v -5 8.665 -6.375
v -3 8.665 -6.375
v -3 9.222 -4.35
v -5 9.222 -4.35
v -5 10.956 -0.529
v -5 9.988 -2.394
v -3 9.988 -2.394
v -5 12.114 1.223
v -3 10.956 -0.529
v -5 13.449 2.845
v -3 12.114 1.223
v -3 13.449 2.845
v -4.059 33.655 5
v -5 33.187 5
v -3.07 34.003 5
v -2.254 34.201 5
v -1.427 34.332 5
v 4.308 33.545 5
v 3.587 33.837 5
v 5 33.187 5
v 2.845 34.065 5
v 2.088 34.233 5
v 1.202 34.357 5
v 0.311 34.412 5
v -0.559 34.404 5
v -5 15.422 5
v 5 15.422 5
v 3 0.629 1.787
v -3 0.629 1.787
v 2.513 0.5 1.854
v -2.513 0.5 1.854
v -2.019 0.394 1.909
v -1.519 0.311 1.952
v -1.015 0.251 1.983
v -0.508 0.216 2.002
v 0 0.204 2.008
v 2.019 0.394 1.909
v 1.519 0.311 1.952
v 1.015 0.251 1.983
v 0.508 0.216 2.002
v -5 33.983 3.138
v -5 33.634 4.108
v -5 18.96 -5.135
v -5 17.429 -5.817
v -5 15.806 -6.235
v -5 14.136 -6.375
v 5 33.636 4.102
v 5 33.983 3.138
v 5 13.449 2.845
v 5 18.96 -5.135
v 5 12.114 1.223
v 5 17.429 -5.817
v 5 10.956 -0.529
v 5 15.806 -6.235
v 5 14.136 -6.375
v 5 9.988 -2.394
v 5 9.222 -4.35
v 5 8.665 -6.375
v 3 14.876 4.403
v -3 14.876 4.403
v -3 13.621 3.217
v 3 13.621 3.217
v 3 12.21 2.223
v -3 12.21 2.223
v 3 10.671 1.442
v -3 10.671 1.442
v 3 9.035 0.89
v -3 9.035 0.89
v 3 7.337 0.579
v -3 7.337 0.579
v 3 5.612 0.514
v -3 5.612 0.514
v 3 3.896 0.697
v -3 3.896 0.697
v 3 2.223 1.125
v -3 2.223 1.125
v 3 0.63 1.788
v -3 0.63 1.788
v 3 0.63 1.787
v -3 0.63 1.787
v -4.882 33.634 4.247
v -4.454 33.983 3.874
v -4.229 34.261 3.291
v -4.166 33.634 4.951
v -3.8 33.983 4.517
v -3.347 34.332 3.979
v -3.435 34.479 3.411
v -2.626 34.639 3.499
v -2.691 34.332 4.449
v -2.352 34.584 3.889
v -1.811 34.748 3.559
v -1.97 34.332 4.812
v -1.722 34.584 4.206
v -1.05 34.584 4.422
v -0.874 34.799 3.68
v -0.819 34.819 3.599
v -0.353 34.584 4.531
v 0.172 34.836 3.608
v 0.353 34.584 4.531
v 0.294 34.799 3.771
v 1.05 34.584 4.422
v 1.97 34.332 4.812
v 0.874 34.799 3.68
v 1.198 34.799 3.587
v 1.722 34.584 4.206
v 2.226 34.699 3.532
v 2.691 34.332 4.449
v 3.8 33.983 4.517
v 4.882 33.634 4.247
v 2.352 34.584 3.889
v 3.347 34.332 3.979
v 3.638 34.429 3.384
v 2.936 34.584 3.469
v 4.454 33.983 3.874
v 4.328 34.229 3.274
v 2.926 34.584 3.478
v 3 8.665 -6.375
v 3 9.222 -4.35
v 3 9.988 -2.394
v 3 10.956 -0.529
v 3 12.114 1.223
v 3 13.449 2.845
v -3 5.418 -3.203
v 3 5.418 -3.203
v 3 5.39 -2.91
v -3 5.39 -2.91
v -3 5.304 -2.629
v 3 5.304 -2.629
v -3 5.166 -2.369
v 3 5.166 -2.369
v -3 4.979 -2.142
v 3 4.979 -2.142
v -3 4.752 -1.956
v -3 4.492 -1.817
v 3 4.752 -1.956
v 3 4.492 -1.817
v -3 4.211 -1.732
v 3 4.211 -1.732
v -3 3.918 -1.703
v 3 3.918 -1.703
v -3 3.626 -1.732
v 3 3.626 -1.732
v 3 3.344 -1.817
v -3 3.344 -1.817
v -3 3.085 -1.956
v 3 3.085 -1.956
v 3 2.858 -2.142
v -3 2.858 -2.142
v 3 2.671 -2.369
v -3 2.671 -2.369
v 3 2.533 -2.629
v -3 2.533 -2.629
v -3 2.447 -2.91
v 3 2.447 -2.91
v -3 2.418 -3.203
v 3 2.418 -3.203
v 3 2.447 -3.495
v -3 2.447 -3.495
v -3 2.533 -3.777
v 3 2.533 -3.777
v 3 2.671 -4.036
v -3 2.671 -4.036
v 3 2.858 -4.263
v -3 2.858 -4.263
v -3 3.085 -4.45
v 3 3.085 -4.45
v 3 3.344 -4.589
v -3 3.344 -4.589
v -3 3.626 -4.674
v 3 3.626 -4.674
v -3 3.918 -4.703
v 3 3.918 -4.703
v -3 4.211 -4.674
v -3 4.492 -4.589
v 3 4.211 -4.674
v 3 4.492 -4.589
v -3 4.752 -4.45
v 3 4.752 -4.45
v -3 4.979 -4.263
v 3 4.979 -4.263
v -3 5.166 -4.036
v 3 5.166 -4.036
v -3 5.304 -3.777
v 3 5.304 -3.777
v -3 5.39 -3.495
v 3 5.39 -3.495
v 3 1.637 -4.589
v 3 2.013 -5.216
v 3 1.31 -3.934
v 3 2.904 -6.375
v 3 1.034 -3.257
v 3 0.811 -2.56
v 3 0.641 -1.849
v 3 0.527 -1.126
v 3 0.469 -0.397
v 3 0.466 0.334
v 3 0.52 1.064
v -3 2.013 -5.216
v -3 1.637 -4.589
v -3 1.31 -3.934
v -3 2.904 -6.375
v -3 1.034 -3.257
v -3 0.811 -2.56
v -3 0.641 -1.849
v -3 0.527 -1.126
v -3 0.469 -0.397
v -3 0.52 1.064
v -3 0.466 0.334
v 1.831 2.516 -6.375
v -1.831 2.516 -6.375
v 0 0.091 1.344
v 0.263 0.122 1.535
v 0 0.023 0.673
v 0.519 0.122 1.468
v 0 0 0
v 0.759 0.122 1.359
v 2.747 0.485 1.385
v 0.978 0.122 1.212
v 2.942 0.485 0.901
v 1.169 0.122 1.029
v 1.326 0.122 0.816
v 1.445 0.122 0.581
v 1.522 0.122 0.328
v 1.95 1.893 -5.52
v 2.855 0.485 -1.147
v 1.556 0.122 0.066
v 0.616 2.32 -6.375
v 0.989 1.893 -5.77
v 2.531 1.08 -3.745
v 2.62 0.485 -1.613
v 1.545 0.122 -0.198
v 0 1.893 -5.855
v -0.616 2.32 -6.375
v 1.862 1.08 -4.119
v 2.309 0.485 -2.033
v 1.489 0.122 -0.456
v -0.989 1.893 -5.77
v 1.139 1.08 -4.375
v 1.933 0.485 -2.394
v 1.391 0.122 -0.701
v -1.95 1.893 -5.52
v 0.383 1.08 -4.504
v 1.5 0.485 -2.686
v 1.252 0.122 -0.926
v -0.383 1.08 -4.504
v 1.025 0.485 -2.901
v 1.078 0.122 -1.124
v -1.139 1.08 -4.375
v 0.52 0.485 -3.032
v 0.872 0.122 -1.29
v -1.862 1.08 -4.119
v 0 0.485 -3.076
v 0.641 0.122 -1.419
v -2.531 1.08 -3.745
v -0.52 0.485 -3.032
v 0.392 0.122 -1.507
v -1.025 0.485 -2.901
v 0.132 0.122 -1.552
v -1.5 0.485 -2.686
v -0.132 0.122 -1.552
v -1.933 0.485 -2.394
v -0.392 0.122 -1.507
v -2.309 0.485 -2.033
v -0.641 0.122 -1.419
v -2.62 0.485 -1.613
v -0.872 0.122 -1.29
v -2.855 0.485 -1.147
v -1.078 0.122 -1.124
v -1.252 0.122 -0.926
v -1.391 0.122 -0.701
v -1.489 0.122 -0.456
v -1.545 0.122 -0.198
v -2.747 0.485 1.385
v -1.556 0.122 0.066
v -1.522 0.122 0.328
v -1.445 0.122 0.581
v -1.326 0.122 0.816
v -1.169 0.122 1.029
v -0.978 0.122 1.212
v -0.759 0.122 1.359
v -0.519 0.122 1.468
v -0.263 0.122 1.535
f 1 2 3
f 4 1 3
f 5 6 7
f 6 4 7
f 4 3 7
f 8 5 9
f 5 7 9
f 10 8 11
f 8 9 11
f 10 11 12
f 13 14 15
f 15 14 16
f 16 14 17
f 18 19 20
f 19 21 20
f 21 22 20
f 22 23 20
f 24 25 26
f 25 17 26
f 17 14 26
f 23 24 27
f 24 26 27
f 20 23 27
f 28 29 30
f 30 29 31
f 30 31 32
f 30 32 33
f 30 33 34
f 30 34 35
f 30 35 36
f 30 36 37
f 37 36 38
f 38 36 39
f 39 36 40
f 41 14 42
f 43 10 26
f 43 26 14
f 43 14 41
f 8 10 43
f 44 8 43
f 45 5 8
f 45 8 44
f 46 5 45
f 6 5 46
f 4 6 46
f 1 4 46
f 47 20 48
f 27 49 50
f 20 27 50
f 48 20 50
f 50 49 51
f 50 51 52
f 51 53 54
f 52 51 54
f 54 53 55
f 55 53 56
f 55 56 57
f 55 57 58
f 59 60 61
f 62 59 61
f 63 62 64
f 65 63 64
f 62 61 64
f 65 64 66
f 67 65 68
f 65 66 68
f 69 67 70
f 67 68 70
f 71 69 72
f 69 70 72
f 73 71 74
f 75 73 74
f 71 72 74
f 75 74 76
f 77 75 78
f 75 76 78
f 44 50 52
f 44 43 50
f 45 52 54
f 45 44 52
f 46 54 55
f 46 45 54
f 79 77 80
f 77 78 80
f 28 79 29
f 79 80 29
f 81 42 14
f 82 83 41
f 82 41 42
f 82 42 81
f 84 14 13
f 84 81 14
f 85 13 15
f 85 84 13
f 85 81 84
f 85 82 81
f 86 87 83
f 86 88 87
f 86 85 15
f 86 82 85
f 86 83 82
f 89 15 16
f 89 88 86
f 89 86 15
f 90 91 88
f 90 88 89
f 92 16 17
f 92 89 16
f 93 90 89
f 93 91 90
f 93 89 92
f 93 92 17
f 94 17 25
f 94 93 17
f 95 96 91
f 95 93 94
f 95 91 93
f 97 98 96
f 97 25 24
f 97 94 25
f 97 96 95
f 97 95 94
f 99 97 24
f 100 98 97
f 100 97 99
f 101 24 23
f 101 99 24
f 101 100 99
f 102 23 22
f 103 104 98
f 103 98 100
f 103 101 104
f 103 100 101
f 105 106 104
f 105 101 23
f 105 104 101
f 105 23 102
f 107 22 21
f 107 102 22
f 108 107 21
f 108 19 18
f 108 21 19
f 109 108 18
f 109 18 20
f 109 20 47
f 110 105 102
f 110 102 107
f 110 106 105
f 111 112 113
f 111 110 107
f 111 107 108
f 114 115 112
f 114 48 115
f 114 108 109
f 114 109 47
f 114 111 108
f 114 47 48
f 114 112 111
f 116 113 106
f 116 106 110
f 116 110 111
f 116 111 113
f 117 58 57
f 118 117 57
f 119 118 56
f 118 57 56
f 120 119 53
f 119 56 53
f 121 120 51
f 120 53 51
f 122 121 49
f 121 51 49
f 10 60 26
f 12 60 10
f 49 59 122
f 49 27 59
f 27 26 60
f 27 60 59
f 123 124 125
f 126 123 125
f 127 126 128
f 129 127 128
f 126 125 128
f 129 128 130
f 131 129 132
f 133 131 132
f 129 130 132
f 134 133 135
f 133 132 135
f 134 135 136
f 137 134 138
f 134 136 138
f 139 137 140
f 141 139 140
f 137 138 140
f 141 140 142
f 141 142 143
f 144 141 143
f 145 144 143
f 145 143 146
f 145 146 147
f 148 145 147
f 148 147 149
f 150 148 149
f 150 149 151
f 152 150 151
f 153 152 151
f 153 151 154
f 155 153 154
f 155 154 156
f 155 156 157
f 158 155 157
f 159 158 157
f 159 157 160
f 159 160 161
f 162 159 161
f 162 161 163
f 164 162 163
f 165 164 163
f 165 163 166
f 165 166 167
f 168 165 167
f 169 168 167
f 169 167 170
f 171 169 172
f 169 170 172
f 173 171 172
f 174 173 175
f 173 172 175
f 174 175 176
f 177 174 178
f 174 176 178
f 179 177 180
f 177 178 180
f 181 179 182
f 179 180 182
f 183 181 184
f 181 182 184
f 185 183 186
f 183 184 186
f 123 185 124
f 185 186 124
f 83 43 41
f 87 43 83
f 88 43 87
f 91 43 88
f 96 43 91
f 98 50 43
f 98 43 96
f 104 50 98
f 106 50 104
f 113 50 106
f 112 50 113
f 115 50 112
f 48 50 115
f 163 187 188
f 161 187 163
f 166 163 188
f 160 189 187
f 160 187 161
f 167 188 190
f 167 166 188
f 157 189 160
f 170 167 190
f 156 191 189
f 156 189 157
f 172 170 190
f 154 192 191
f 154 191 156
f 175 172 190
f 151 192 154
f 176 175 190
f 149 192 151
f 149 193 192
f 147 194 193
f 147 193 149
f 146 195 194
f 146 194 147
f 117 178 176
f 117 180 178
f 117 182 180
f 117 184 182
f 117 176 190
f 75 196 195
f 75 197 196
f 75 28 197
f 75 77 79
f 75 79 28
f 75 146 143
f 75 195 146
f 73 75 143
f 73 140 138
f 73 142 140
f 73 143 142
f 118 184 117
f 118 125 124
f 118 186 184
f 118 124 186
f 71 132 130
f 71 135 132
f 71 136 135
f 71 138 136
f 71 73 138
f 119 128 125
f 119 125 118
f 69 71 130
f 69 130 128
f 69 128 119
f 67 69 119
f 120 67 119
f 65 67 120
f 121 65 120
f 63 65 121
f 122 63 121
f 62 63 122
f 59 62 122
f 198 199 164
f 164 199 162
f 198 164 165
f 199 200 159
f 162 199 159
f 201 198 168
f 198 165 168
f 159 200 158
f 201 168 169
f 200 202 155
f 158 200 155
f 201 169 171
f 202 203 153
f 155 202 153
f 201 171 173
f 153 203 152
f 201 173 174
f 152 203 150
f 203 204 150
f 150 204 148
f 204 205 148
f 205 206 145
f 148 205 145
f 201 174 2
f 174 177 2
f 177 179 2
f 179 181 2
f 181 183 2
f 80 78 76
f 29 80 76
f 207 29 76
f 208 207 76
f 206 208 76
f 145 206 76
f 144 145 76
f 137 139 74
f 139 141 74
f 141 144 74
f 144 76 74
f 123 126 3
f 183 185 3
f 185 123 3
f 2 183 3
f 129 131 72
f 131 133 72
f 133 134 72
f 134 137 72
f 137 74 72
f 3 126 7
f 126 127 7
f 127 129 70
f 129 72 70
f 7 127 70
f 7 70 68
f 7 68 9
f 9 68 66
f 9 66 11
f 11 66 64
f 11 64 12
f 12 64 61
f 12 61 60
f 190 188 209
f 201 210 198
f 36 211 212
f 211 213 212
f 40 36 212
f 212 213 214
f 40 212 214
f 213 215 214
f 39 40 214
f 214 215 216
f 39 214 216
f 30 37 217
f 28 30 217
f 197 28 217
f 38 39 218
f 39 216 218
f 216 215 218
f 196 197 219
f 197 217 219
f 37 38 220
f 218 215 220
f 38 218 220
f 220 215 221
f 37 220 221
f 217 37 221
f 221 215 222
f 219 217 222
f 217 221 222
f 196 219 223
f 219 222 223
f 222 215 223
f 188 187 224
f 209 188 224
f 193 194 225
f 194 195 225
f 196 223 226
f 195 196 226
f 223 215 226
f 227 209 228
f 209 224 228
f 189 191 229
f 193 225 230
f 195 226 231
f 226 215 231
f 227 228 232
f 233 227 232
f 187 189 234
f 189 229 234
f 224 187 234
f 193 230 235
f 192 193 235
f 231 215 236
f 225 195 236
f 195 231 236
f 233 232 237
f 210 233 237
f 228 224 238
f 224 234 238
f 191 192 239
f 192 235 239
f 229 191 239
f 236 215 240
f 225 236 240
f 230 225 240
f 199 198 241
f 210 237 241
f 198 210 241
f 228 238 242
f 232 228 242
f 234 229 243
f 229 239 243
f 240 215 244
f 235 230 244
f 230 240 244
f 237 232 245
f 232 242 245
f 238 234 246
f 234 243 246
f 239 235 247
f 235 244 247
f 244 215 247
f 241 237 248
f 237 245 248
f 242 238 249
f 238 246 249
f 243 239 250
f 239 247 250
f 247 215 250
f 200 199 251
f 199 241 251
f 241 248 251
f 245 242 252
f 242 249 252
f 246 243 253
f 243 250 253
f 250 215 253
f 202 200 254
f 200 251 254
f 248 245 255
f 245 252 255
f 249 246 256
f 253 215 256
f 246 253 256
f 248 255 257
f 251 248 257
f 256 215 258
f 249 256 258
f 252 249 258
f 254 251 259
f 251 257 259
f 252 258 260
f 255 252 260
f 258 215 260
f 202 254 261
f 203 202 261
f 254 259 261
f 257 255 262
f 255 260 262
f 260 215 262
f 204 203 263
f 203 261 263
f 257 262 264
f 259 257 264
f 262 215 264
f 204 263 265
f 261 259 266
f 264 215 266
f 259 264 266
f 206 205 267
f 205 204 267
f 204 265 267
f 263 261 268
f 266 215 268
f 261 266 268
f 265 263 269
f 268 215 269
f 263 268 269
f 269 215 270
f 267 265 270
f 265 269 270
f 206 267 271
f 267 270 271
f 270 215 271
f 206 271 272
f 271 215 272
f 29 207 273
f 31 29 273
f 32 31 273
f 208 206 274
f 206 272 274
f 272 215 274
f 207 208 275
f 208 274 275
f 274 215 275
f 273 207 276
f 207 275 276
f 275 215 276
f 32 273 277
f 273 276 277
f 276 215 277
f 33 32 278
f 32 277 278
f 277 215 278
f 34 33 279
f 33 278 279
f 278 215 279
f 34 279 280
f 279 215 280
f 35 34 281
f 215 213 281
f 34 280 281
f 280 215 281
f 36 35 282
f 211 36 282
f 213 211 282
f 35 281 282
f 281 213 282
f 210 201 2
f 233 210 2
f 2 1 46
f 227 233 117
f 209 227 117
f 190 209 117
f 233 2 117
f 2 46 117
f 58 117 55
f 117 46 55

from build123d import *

# Parameters (mm, degrees)
SKETCH1_R           = 10
EXTRUDE1_DEPTH      = 35
FILLET1_R           = 10
FILLET_1_R          = 8
SKETCH2_W           = 7.672344266
SKETCH2_H           = 13.422166089
EXTRUDE2_DEPTH      = 20
SKETCH5_W           = 6.488658855
SKETCH5_H           = 20.959398048
EXTRUDE4_DEPTH      = 38.749172176
SKETCH7_W           = 24.373627343
SKETCH7_H           = 7.918162835
SKETCH7_H_2         = 6.543162835
EXTRUDE6_DEPTH      = 46
SKETCH10_R          = 1.5
CUT_EXTRUDE2_DEPTH  = 37.464237757
CUT_EXTRUDE3_DEPTH  = 37.954575301
FILLET2_START       = -3
FILLET2_OUTLINE_R   = 1.5
FILLET2_DEPTH       = 6
FILLET3_R           = 20
CUT_EXTRUDE_1_DEPTH = 37.954575301
FILLET_2_R          = 10


with BuildPart() as part:
    # Sketch1 → Extrude1 (new body)
    with BuildSketch(Plane(origin=(0, 0, 0), x_dir=(1, 0, 0), z_dir=(0, 1, 0))):
        with Locations(Location((0, 0, 0), (0, 0, 270))):
            Circle(SKETCH1_R)
    extrude(amount=EXTRUDE1_DEPTH)

    # Fillet1
    fillet1_edges = [part.edges().sort_by_distance(p)[0] for p in [
        (0, 0, -10),
    ]]
    fillet(fillet1_edges, radius=FILLET1_R)

    # Скругление1
    fillet_1_edges = [part.edges().sort_by_distance(p)[0] for p in [
        (0, 35, -10),
    ]]
    fillet(fillet_1_edges, radius=FILLET_1_R)

    # Sketch2 → Extrude2 (cut, symmetric)
    with BuildSketch(Plane.XY):
        with Locations((6.836172133, 1.953557325)):
            Rectangle(SKETCH2_W, SKETCH2_H)
        with Locations((-6.836172133, 1.953557325)):
            Rectangle(SKETCH2_W, SKETCH2_H)
    extrude(amount=EXTRUDE2_DEPTH, both=True, mode=Mode.SUBTRACT)

    # Sketch5 → Extrude4 (cut, through all)
    with BuildSketch(Plane(origin=(0, 0, 0), x_dir=(1, 0, 0), z_dir=(0, 1, 0))):
        with Locations((8.244329428, 0.450601309)):
            Rectangle(SKETCH5_W, SKETCH5_H)
        with Locations((-8.244329428, 0.450601309)):
            Rectangle(SKETCH5_W, SKETCH5_H)
    extrude(amount=EXTRUDE4_DEPTH, mode=Mode.SUBTRACT)

    # Sketch7 → Extrude6 (cut, symmetric)
    with BuildSketch(Plane(origin=(0, 0, 0), x_dir=(1, 0, 0), z_dir=(0, 1, 0))):
        with Locations((-0.125613483, -8.959081418)):
            Rectangle(SKETCH7_W, SKETCH7_H)
        with Locations((-0.125613483, 9.646581418)):
            Rectangle(SKETCH7_W, SKETCH7_H_2)
    extrude(amount=EXTRUDE6_DEPTH, both=True, mode=Mode.SUBTRACT)

    # Sketch10 → Cut-Extrude2 (cut, through all)
    with BuildSketch(Plane(origin=(3, 0, 0), x_dir=(0, 0, -1), z_dir=(1, 0, 0))):
        with Locations(Location((3.202782465, 3.918341245, 0), (0, 0, 90))):
            Circle(SKETCH10_R)
    extrude(amount=-CUT_EXTRUDE2_DEPTH, mode=Mode.SUBTRACT)

    # Sketch12 → Cut-Extrude3 (cut, through all)
    with BuildSketch(Plane(origin=(5, 0, 0), x_dir=(0, 0, -1), z_dir=(1, 0, 0))):
        Polygon((-5, 15.421884283), (2.380521482, 8.664640369), (-3.375305401, -2.43292564), (-5, -2.43292564), align=None)
    extrude(amount=-CUT_EXTRUDE3_DEPTH, mode=Mode.SUBTRACT)

    # Fillet2: read off the stored shape, not the designer's step
    # Fillet2 outline → Fillet2 (add)
    with BuildSketch(Plane.YZ.offset(FILLET2_START)):
        with BuildLine():
            ThreePointArc((0.62964824, 1.787878044), (0.810500421, -2.559901853), (2.903566036, -6.375))
            Line((2.903566036, -6.375), (8.664640369, -6.375))
            Line((8.664640369, -6.375), (8.664640369, -2.380521482))
            Line((8.664640369, -2.380521482), (14.875593683, 4.403320413))
            ThreePointArc((14.875593683, 4.403320413), (8.191715719, 0.703912056), (0.62964824, 1.787878044))
        make_face()
        with Locations((3.918341245, -3.202782465)):
            Circle(FILLET2_OUTLINE_R, mode=Mode.SUBTRACT)
    extrude(amount=FILLET2_DEPTH)

    # Fillet3
    # the kernel refuses this fillet: 20 mm, written as the material it takes off along each edge
    with BuildSketch(Plane(origin=(14.71184435, 8.664640369, -2.380521482), x_dir=(0, 0.6752773616828561, 0.7375638852320802), z_dir=(-1, 0, 0))) as fillet3_piece_1_section:
        with BuildLine():
            CenterArc((7.08473774, 20), FILLET3_R, 239.897661879, 30.102338121)
            Line((-2.946183095, 2.697380915), (-3.146801512, 2.351328533))
            ThreePointArc((-3.146801512, 2.351328533), (-1.743202492, 1.053664903), (-0.270110945, -0.295025554))
            Line((-0.270110945, -0.295025554), (0, -0.4))
            Line((0, -0.4), (7.08473774, -0.4))
            Line((7.08473774, -0.4), (7.08473774, 0))
        make_face()
    fillet3_piece_1 = extrude(amount=37.423688699, mode=Mode.PRIVATE)
    fillet3_piece_1 = split(fillet3_piece_1, bisect_by=Plane(origin=(3, 8.664640369, -2.380521482), z_dir=(1, 0, 0)), keep=Keep.TOP, mode=Mode.PRIVATE)
    add(fillet3_piece_1, mode=Mode.SUBTRACT)
    with BuildSketch(Plane(origin=(-3, 8.664640369, -2.380521482), x_dir=(0, 0.6752773616828561, 0.7375638852320802), z_dir=(-1, 0, 0)), Plane(origin=(22.71184435, 8.664640369, -2.380521482), x_dir=(0, 0.6752773616828562, 0.7375638852320802), z_dir=(-1, 0, 0))) as fillet3_piece_2:
        with BuildLine():
            CenterArc((7.08473774, 20), FILLET3_R, 239.897661879, 30.102338121)
            Line((-2.946183095, 2.697380915), (-3.146801512, 2.351328533))
            ThreePointArc((-3.146801512, 2.351328533), (-1.743202492, 1.053664903), (-0.270110945, -0.295025554))
            Line((-0.270110945, -0.295025554), (0, -0.4))
            Line((0, -0.4), (7.08473774, -0.4))
            Line((7.08473774, -0.4), (7.08473774, 0))
        make_face()
    extrude(amount=19.71184435, mode=Mode.SUBTRACT)
    with BuildSketch(Plane(origin=(22.71184435, 8.664640369, -2.380521482), x_dir=(0, 0.6752773616828562, 0.7375638852320802), z_dir=(-1, 0, 0))) as fillet3_piece_3_section:
        with BuildLine():
            CenterArc((7.08473774, 20), FILLET3_R, 239.897661879, 30.102338121)
            Line((-2.946183095, 2.697380915), (-3.146801512, 2.351328533))
            ThreePointArc((-3.146801512, 2.351328533), (-1.743202492, 1.053664903), (-0.270110945, -0.295025554))
            Line((-0.270110945, -0.295025554), (0, -0.4))
            Line((0, -0.4), (7.08473774, -0.4))
            Line((7.08473774, -0.4), (7.08473774, 0))
        make_face()
    fillet3_piece_3 = extrude(amount=37.423688699, mode=Mode.PRIVATE)
    fillet3_piece_3 = split(fillet3_piece_3, bisect_by=Plane(origin=(-3, 8.664640369, -2.380521482), z_dir=(-1, 0, 0)), keep=Keep.TOP, mode=Mode.PRIVATE)
    add(fillet3_piece_3, mode=Mode.SUBTRACT)

    # Эскиз1 → Вырез-Вытянуть1 (cut, through all)
    with BuildSketch(Plane(origin=(5, 0, 0), x_dir=(0, 0, -1), z_dir=(1, 0, 0))):
        Polygon((-4.197009704, 35.90598138), (7.773675874, 35.90598138), (7.773675874, 14.167506287), align=None)
    extrude(amount=-CUT_EXTRUDE_1_DEPTH, mode=Mode.SUBTRACT)

    # Скругление2
    fillet_2_edges = [part.edges().sort_by_distance(p)[0] for p in [
        (-1.1e-08, 16.707467799, -6.375),
    ]]
    fillet(fillet_2_edges, radius=FILLET_2_R)


solid = part.part
